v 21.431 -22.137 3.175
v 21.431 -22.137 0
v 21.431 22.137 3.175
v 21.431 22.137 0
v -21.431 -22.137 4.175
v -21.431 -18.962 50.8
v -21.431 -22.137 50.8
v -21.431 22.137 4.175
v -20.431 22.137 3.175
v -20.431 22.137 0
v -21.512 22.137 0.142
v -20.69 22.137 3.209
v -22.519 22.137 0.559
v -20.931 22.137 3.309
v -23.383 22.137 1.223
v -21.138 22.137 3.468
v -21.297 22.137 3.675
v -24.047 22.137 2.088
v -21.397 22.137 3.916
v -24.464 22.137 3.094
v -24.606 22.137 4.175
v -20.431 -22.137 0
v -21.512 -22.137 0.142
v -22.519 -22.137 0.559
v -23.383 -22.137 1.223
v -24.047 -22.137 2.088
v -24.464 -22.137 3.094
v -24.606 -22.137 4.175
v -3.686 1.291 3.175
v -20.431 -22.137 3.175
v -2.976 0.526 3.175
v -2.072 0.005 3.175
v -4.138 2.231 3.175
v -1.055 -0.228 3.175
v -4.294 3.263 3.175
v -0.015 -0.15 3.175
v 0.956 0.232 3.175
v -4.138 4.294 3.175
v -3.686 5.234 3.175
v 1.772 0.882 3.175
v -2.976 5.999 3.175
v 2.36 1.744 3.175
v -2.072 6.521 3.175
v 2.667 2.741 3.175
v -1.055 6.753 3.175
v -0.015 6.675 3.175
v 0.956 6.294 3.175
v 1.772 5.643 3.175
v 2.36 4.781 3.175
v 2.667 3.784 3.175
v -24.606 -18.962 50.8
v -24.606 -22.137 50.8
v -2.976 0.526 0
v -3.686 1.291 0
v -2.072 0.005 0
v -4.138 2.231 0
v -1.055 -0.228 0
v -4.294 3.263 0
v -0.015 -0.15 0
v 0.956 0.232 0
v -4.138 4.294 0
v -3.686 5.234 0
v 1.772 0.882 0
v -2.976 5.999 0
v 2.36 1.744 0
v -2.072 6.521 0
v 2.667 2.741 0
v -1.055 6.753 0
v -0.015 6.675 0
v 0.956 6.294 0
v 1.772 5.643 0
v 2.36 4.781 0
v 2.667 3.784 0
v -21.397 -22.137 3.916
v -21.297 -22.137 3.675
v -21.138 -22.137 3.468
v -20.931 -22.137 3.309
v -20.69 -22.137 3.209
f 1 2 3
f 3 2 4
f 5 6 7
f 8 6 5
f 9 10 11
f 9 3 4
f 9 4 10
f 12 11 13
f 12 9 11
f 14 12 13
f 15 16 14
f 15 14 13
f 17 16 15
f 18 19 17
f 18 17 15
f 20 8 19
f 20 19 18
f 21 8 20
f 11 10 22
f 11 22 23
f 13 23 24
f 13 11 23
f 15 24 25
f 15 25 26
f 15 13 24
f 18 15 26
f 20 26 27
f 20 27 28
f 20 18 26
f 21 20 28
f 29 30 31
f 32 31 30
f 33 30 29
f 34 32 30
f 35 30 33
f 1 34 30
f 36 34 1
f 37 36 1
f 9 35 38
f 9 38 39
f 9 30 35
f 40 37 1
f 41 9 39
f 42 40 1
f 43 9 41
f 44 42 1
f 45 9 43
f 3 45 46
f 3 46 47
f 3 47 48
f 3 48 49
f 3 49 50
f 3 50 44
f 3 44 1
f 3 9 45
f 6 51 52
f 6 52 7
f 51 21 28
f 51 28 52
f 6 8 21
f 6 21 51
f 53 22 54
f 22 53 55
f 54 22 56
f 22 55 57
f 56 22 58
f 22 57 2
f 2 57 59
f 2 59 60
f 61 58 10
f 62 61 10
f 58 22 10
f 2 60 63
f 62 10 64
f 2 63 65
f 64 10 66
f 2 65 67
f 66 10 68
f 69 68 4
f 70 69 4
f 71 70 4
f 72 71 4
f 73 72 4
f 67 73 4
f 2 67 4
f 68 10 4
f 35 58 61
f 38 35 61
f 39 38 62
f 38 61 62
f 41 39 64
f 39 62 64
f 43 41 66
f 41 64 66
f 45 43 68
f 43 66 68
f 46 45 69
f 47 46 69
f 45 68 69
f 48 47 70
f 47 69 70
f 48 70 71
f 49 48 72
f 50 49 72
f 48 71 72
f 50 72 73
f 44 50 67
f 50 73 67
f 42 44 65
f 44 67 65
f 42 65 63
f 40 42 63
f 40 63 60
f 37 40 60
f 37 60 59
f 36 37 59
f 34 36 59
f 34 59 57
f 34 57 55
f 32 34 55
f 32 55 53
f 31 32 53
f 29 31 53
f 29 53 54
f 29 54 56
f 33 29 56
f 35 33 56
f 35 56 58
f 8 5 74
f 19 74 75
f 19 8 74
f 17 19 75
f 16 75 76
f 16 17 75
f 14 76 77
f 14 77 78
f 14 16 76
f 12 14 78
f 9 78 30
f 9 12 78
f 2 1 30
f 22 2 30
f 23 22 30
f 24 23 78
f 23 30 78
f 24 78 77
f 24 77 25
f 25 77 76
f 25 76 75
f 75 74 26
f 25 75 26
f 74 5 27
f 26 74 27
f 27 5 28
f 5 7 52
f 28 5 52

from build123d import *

# Parameters (mm, degrees)
SKETCH1_W                    = 42.8625
SKETCH1_H                    = 44.27474
SKETCH1_R                    = 3
BASE_FLANGE1_DEPTH           = 3.175
EDGE_FLANGE1_STRIP_W         = 14.7
EDGE_FLANGE1_STRIP_H         = 3.175
EDGE_FLANGE1_STRIP_CUT_DEPTH = 44.27474
EDGE_FLANGE1_DEPTH           = 44.27474
CUT_EXTRUDE1_DEPTH           = 73.0427273
CUT_EXTRUDE1_DEPTH_BACK      = 3.175
M6_CLEARANCE_HOLE6_D         = 7


# Sheet-metal steps are written as plain solids
with BuildPart() as part:
    # Sketch1 → Base-Flange1 (new body)
    with BuildSketch(Plane.XY):
        Rectangle(SKETCH1_W, SKETCH1_H)
        with Locations((-0.79375, 3.26263)):
            Circle(SKETCH1_R, mode=Mode.SUBTRACT)
    extrude(amount=BASE_FLANGE1_DEPTH)

    # Edge-Flange1 strip (across the edge) → Edge-Flange1 strip cut (cut)
    with BuildSketch(Plane(origin=(-21.43125, 22.13737, 3.175), x_dir=(1, 0, 0), z_dir=(0, -1, 0))):
        with Locations((-6.35, -1.5875)):
            Rectangle(EDGE_FLANGE1_STRIP_W, EDGE_FLANGE1_STRIP_H)
    extrude(amount=EDGE_FLANGE1_STRIP_CUT_DEPTH, mode=Mode.SUBTRACT)

    # Edge-Flange1 section (across the edge) → Edge-Flange1 (add)
    with BuildSketch(Plane(origin=(-21.43125, 22.13737, 3.175), x_dir=(1, 0, 0), z_dir=(0, -1, 0))):
        with BuildLine():
            Line((-3.175, 1), (-3.175, 47.625))
            Line((-3.175, 47.625), (0, 47.625))
            Line((0, 47.625), (0, 1))
            ThreePointArc((0, 1), (0.292893219, 0.292893219), (1, 0))
            Line((1, 0), (1, -3.175))
            ThreePointArc((1, -3.175), (-1.952170811, -1.952170811), (-3.175, 1))
        make_face()
    extrude(amount=EDGE_FLANGE1_DEPTH)

    # Sketch10 → Cut-Extrude1 (cut, two sides: drawn at the far end of the back side and taken through both)
    with BuildSketch(Plane.ZY.offset(24.60625).offset(-CUT_EXTRUDE1_DEPTH_BACK)):
        Polygon((4.175, 22.13737), (50.8, -18.96237), (50.8, 22.13737), align=None)
    extrude(amount=CUT_EXTRUDE1_DEPTH + CUT_EXTRUDE1_DEPTH_BACK, mode=Mode.SUBTRACT)

    # M6 Clearance Hole6 (through all)
    with Locations(Plane.XY.offset(3.175)):
        with Locations((-0.79375, 3.26263)):
            Hole(M6_CLEARANCE_HOLE6_D / 2)


solid = part.part
